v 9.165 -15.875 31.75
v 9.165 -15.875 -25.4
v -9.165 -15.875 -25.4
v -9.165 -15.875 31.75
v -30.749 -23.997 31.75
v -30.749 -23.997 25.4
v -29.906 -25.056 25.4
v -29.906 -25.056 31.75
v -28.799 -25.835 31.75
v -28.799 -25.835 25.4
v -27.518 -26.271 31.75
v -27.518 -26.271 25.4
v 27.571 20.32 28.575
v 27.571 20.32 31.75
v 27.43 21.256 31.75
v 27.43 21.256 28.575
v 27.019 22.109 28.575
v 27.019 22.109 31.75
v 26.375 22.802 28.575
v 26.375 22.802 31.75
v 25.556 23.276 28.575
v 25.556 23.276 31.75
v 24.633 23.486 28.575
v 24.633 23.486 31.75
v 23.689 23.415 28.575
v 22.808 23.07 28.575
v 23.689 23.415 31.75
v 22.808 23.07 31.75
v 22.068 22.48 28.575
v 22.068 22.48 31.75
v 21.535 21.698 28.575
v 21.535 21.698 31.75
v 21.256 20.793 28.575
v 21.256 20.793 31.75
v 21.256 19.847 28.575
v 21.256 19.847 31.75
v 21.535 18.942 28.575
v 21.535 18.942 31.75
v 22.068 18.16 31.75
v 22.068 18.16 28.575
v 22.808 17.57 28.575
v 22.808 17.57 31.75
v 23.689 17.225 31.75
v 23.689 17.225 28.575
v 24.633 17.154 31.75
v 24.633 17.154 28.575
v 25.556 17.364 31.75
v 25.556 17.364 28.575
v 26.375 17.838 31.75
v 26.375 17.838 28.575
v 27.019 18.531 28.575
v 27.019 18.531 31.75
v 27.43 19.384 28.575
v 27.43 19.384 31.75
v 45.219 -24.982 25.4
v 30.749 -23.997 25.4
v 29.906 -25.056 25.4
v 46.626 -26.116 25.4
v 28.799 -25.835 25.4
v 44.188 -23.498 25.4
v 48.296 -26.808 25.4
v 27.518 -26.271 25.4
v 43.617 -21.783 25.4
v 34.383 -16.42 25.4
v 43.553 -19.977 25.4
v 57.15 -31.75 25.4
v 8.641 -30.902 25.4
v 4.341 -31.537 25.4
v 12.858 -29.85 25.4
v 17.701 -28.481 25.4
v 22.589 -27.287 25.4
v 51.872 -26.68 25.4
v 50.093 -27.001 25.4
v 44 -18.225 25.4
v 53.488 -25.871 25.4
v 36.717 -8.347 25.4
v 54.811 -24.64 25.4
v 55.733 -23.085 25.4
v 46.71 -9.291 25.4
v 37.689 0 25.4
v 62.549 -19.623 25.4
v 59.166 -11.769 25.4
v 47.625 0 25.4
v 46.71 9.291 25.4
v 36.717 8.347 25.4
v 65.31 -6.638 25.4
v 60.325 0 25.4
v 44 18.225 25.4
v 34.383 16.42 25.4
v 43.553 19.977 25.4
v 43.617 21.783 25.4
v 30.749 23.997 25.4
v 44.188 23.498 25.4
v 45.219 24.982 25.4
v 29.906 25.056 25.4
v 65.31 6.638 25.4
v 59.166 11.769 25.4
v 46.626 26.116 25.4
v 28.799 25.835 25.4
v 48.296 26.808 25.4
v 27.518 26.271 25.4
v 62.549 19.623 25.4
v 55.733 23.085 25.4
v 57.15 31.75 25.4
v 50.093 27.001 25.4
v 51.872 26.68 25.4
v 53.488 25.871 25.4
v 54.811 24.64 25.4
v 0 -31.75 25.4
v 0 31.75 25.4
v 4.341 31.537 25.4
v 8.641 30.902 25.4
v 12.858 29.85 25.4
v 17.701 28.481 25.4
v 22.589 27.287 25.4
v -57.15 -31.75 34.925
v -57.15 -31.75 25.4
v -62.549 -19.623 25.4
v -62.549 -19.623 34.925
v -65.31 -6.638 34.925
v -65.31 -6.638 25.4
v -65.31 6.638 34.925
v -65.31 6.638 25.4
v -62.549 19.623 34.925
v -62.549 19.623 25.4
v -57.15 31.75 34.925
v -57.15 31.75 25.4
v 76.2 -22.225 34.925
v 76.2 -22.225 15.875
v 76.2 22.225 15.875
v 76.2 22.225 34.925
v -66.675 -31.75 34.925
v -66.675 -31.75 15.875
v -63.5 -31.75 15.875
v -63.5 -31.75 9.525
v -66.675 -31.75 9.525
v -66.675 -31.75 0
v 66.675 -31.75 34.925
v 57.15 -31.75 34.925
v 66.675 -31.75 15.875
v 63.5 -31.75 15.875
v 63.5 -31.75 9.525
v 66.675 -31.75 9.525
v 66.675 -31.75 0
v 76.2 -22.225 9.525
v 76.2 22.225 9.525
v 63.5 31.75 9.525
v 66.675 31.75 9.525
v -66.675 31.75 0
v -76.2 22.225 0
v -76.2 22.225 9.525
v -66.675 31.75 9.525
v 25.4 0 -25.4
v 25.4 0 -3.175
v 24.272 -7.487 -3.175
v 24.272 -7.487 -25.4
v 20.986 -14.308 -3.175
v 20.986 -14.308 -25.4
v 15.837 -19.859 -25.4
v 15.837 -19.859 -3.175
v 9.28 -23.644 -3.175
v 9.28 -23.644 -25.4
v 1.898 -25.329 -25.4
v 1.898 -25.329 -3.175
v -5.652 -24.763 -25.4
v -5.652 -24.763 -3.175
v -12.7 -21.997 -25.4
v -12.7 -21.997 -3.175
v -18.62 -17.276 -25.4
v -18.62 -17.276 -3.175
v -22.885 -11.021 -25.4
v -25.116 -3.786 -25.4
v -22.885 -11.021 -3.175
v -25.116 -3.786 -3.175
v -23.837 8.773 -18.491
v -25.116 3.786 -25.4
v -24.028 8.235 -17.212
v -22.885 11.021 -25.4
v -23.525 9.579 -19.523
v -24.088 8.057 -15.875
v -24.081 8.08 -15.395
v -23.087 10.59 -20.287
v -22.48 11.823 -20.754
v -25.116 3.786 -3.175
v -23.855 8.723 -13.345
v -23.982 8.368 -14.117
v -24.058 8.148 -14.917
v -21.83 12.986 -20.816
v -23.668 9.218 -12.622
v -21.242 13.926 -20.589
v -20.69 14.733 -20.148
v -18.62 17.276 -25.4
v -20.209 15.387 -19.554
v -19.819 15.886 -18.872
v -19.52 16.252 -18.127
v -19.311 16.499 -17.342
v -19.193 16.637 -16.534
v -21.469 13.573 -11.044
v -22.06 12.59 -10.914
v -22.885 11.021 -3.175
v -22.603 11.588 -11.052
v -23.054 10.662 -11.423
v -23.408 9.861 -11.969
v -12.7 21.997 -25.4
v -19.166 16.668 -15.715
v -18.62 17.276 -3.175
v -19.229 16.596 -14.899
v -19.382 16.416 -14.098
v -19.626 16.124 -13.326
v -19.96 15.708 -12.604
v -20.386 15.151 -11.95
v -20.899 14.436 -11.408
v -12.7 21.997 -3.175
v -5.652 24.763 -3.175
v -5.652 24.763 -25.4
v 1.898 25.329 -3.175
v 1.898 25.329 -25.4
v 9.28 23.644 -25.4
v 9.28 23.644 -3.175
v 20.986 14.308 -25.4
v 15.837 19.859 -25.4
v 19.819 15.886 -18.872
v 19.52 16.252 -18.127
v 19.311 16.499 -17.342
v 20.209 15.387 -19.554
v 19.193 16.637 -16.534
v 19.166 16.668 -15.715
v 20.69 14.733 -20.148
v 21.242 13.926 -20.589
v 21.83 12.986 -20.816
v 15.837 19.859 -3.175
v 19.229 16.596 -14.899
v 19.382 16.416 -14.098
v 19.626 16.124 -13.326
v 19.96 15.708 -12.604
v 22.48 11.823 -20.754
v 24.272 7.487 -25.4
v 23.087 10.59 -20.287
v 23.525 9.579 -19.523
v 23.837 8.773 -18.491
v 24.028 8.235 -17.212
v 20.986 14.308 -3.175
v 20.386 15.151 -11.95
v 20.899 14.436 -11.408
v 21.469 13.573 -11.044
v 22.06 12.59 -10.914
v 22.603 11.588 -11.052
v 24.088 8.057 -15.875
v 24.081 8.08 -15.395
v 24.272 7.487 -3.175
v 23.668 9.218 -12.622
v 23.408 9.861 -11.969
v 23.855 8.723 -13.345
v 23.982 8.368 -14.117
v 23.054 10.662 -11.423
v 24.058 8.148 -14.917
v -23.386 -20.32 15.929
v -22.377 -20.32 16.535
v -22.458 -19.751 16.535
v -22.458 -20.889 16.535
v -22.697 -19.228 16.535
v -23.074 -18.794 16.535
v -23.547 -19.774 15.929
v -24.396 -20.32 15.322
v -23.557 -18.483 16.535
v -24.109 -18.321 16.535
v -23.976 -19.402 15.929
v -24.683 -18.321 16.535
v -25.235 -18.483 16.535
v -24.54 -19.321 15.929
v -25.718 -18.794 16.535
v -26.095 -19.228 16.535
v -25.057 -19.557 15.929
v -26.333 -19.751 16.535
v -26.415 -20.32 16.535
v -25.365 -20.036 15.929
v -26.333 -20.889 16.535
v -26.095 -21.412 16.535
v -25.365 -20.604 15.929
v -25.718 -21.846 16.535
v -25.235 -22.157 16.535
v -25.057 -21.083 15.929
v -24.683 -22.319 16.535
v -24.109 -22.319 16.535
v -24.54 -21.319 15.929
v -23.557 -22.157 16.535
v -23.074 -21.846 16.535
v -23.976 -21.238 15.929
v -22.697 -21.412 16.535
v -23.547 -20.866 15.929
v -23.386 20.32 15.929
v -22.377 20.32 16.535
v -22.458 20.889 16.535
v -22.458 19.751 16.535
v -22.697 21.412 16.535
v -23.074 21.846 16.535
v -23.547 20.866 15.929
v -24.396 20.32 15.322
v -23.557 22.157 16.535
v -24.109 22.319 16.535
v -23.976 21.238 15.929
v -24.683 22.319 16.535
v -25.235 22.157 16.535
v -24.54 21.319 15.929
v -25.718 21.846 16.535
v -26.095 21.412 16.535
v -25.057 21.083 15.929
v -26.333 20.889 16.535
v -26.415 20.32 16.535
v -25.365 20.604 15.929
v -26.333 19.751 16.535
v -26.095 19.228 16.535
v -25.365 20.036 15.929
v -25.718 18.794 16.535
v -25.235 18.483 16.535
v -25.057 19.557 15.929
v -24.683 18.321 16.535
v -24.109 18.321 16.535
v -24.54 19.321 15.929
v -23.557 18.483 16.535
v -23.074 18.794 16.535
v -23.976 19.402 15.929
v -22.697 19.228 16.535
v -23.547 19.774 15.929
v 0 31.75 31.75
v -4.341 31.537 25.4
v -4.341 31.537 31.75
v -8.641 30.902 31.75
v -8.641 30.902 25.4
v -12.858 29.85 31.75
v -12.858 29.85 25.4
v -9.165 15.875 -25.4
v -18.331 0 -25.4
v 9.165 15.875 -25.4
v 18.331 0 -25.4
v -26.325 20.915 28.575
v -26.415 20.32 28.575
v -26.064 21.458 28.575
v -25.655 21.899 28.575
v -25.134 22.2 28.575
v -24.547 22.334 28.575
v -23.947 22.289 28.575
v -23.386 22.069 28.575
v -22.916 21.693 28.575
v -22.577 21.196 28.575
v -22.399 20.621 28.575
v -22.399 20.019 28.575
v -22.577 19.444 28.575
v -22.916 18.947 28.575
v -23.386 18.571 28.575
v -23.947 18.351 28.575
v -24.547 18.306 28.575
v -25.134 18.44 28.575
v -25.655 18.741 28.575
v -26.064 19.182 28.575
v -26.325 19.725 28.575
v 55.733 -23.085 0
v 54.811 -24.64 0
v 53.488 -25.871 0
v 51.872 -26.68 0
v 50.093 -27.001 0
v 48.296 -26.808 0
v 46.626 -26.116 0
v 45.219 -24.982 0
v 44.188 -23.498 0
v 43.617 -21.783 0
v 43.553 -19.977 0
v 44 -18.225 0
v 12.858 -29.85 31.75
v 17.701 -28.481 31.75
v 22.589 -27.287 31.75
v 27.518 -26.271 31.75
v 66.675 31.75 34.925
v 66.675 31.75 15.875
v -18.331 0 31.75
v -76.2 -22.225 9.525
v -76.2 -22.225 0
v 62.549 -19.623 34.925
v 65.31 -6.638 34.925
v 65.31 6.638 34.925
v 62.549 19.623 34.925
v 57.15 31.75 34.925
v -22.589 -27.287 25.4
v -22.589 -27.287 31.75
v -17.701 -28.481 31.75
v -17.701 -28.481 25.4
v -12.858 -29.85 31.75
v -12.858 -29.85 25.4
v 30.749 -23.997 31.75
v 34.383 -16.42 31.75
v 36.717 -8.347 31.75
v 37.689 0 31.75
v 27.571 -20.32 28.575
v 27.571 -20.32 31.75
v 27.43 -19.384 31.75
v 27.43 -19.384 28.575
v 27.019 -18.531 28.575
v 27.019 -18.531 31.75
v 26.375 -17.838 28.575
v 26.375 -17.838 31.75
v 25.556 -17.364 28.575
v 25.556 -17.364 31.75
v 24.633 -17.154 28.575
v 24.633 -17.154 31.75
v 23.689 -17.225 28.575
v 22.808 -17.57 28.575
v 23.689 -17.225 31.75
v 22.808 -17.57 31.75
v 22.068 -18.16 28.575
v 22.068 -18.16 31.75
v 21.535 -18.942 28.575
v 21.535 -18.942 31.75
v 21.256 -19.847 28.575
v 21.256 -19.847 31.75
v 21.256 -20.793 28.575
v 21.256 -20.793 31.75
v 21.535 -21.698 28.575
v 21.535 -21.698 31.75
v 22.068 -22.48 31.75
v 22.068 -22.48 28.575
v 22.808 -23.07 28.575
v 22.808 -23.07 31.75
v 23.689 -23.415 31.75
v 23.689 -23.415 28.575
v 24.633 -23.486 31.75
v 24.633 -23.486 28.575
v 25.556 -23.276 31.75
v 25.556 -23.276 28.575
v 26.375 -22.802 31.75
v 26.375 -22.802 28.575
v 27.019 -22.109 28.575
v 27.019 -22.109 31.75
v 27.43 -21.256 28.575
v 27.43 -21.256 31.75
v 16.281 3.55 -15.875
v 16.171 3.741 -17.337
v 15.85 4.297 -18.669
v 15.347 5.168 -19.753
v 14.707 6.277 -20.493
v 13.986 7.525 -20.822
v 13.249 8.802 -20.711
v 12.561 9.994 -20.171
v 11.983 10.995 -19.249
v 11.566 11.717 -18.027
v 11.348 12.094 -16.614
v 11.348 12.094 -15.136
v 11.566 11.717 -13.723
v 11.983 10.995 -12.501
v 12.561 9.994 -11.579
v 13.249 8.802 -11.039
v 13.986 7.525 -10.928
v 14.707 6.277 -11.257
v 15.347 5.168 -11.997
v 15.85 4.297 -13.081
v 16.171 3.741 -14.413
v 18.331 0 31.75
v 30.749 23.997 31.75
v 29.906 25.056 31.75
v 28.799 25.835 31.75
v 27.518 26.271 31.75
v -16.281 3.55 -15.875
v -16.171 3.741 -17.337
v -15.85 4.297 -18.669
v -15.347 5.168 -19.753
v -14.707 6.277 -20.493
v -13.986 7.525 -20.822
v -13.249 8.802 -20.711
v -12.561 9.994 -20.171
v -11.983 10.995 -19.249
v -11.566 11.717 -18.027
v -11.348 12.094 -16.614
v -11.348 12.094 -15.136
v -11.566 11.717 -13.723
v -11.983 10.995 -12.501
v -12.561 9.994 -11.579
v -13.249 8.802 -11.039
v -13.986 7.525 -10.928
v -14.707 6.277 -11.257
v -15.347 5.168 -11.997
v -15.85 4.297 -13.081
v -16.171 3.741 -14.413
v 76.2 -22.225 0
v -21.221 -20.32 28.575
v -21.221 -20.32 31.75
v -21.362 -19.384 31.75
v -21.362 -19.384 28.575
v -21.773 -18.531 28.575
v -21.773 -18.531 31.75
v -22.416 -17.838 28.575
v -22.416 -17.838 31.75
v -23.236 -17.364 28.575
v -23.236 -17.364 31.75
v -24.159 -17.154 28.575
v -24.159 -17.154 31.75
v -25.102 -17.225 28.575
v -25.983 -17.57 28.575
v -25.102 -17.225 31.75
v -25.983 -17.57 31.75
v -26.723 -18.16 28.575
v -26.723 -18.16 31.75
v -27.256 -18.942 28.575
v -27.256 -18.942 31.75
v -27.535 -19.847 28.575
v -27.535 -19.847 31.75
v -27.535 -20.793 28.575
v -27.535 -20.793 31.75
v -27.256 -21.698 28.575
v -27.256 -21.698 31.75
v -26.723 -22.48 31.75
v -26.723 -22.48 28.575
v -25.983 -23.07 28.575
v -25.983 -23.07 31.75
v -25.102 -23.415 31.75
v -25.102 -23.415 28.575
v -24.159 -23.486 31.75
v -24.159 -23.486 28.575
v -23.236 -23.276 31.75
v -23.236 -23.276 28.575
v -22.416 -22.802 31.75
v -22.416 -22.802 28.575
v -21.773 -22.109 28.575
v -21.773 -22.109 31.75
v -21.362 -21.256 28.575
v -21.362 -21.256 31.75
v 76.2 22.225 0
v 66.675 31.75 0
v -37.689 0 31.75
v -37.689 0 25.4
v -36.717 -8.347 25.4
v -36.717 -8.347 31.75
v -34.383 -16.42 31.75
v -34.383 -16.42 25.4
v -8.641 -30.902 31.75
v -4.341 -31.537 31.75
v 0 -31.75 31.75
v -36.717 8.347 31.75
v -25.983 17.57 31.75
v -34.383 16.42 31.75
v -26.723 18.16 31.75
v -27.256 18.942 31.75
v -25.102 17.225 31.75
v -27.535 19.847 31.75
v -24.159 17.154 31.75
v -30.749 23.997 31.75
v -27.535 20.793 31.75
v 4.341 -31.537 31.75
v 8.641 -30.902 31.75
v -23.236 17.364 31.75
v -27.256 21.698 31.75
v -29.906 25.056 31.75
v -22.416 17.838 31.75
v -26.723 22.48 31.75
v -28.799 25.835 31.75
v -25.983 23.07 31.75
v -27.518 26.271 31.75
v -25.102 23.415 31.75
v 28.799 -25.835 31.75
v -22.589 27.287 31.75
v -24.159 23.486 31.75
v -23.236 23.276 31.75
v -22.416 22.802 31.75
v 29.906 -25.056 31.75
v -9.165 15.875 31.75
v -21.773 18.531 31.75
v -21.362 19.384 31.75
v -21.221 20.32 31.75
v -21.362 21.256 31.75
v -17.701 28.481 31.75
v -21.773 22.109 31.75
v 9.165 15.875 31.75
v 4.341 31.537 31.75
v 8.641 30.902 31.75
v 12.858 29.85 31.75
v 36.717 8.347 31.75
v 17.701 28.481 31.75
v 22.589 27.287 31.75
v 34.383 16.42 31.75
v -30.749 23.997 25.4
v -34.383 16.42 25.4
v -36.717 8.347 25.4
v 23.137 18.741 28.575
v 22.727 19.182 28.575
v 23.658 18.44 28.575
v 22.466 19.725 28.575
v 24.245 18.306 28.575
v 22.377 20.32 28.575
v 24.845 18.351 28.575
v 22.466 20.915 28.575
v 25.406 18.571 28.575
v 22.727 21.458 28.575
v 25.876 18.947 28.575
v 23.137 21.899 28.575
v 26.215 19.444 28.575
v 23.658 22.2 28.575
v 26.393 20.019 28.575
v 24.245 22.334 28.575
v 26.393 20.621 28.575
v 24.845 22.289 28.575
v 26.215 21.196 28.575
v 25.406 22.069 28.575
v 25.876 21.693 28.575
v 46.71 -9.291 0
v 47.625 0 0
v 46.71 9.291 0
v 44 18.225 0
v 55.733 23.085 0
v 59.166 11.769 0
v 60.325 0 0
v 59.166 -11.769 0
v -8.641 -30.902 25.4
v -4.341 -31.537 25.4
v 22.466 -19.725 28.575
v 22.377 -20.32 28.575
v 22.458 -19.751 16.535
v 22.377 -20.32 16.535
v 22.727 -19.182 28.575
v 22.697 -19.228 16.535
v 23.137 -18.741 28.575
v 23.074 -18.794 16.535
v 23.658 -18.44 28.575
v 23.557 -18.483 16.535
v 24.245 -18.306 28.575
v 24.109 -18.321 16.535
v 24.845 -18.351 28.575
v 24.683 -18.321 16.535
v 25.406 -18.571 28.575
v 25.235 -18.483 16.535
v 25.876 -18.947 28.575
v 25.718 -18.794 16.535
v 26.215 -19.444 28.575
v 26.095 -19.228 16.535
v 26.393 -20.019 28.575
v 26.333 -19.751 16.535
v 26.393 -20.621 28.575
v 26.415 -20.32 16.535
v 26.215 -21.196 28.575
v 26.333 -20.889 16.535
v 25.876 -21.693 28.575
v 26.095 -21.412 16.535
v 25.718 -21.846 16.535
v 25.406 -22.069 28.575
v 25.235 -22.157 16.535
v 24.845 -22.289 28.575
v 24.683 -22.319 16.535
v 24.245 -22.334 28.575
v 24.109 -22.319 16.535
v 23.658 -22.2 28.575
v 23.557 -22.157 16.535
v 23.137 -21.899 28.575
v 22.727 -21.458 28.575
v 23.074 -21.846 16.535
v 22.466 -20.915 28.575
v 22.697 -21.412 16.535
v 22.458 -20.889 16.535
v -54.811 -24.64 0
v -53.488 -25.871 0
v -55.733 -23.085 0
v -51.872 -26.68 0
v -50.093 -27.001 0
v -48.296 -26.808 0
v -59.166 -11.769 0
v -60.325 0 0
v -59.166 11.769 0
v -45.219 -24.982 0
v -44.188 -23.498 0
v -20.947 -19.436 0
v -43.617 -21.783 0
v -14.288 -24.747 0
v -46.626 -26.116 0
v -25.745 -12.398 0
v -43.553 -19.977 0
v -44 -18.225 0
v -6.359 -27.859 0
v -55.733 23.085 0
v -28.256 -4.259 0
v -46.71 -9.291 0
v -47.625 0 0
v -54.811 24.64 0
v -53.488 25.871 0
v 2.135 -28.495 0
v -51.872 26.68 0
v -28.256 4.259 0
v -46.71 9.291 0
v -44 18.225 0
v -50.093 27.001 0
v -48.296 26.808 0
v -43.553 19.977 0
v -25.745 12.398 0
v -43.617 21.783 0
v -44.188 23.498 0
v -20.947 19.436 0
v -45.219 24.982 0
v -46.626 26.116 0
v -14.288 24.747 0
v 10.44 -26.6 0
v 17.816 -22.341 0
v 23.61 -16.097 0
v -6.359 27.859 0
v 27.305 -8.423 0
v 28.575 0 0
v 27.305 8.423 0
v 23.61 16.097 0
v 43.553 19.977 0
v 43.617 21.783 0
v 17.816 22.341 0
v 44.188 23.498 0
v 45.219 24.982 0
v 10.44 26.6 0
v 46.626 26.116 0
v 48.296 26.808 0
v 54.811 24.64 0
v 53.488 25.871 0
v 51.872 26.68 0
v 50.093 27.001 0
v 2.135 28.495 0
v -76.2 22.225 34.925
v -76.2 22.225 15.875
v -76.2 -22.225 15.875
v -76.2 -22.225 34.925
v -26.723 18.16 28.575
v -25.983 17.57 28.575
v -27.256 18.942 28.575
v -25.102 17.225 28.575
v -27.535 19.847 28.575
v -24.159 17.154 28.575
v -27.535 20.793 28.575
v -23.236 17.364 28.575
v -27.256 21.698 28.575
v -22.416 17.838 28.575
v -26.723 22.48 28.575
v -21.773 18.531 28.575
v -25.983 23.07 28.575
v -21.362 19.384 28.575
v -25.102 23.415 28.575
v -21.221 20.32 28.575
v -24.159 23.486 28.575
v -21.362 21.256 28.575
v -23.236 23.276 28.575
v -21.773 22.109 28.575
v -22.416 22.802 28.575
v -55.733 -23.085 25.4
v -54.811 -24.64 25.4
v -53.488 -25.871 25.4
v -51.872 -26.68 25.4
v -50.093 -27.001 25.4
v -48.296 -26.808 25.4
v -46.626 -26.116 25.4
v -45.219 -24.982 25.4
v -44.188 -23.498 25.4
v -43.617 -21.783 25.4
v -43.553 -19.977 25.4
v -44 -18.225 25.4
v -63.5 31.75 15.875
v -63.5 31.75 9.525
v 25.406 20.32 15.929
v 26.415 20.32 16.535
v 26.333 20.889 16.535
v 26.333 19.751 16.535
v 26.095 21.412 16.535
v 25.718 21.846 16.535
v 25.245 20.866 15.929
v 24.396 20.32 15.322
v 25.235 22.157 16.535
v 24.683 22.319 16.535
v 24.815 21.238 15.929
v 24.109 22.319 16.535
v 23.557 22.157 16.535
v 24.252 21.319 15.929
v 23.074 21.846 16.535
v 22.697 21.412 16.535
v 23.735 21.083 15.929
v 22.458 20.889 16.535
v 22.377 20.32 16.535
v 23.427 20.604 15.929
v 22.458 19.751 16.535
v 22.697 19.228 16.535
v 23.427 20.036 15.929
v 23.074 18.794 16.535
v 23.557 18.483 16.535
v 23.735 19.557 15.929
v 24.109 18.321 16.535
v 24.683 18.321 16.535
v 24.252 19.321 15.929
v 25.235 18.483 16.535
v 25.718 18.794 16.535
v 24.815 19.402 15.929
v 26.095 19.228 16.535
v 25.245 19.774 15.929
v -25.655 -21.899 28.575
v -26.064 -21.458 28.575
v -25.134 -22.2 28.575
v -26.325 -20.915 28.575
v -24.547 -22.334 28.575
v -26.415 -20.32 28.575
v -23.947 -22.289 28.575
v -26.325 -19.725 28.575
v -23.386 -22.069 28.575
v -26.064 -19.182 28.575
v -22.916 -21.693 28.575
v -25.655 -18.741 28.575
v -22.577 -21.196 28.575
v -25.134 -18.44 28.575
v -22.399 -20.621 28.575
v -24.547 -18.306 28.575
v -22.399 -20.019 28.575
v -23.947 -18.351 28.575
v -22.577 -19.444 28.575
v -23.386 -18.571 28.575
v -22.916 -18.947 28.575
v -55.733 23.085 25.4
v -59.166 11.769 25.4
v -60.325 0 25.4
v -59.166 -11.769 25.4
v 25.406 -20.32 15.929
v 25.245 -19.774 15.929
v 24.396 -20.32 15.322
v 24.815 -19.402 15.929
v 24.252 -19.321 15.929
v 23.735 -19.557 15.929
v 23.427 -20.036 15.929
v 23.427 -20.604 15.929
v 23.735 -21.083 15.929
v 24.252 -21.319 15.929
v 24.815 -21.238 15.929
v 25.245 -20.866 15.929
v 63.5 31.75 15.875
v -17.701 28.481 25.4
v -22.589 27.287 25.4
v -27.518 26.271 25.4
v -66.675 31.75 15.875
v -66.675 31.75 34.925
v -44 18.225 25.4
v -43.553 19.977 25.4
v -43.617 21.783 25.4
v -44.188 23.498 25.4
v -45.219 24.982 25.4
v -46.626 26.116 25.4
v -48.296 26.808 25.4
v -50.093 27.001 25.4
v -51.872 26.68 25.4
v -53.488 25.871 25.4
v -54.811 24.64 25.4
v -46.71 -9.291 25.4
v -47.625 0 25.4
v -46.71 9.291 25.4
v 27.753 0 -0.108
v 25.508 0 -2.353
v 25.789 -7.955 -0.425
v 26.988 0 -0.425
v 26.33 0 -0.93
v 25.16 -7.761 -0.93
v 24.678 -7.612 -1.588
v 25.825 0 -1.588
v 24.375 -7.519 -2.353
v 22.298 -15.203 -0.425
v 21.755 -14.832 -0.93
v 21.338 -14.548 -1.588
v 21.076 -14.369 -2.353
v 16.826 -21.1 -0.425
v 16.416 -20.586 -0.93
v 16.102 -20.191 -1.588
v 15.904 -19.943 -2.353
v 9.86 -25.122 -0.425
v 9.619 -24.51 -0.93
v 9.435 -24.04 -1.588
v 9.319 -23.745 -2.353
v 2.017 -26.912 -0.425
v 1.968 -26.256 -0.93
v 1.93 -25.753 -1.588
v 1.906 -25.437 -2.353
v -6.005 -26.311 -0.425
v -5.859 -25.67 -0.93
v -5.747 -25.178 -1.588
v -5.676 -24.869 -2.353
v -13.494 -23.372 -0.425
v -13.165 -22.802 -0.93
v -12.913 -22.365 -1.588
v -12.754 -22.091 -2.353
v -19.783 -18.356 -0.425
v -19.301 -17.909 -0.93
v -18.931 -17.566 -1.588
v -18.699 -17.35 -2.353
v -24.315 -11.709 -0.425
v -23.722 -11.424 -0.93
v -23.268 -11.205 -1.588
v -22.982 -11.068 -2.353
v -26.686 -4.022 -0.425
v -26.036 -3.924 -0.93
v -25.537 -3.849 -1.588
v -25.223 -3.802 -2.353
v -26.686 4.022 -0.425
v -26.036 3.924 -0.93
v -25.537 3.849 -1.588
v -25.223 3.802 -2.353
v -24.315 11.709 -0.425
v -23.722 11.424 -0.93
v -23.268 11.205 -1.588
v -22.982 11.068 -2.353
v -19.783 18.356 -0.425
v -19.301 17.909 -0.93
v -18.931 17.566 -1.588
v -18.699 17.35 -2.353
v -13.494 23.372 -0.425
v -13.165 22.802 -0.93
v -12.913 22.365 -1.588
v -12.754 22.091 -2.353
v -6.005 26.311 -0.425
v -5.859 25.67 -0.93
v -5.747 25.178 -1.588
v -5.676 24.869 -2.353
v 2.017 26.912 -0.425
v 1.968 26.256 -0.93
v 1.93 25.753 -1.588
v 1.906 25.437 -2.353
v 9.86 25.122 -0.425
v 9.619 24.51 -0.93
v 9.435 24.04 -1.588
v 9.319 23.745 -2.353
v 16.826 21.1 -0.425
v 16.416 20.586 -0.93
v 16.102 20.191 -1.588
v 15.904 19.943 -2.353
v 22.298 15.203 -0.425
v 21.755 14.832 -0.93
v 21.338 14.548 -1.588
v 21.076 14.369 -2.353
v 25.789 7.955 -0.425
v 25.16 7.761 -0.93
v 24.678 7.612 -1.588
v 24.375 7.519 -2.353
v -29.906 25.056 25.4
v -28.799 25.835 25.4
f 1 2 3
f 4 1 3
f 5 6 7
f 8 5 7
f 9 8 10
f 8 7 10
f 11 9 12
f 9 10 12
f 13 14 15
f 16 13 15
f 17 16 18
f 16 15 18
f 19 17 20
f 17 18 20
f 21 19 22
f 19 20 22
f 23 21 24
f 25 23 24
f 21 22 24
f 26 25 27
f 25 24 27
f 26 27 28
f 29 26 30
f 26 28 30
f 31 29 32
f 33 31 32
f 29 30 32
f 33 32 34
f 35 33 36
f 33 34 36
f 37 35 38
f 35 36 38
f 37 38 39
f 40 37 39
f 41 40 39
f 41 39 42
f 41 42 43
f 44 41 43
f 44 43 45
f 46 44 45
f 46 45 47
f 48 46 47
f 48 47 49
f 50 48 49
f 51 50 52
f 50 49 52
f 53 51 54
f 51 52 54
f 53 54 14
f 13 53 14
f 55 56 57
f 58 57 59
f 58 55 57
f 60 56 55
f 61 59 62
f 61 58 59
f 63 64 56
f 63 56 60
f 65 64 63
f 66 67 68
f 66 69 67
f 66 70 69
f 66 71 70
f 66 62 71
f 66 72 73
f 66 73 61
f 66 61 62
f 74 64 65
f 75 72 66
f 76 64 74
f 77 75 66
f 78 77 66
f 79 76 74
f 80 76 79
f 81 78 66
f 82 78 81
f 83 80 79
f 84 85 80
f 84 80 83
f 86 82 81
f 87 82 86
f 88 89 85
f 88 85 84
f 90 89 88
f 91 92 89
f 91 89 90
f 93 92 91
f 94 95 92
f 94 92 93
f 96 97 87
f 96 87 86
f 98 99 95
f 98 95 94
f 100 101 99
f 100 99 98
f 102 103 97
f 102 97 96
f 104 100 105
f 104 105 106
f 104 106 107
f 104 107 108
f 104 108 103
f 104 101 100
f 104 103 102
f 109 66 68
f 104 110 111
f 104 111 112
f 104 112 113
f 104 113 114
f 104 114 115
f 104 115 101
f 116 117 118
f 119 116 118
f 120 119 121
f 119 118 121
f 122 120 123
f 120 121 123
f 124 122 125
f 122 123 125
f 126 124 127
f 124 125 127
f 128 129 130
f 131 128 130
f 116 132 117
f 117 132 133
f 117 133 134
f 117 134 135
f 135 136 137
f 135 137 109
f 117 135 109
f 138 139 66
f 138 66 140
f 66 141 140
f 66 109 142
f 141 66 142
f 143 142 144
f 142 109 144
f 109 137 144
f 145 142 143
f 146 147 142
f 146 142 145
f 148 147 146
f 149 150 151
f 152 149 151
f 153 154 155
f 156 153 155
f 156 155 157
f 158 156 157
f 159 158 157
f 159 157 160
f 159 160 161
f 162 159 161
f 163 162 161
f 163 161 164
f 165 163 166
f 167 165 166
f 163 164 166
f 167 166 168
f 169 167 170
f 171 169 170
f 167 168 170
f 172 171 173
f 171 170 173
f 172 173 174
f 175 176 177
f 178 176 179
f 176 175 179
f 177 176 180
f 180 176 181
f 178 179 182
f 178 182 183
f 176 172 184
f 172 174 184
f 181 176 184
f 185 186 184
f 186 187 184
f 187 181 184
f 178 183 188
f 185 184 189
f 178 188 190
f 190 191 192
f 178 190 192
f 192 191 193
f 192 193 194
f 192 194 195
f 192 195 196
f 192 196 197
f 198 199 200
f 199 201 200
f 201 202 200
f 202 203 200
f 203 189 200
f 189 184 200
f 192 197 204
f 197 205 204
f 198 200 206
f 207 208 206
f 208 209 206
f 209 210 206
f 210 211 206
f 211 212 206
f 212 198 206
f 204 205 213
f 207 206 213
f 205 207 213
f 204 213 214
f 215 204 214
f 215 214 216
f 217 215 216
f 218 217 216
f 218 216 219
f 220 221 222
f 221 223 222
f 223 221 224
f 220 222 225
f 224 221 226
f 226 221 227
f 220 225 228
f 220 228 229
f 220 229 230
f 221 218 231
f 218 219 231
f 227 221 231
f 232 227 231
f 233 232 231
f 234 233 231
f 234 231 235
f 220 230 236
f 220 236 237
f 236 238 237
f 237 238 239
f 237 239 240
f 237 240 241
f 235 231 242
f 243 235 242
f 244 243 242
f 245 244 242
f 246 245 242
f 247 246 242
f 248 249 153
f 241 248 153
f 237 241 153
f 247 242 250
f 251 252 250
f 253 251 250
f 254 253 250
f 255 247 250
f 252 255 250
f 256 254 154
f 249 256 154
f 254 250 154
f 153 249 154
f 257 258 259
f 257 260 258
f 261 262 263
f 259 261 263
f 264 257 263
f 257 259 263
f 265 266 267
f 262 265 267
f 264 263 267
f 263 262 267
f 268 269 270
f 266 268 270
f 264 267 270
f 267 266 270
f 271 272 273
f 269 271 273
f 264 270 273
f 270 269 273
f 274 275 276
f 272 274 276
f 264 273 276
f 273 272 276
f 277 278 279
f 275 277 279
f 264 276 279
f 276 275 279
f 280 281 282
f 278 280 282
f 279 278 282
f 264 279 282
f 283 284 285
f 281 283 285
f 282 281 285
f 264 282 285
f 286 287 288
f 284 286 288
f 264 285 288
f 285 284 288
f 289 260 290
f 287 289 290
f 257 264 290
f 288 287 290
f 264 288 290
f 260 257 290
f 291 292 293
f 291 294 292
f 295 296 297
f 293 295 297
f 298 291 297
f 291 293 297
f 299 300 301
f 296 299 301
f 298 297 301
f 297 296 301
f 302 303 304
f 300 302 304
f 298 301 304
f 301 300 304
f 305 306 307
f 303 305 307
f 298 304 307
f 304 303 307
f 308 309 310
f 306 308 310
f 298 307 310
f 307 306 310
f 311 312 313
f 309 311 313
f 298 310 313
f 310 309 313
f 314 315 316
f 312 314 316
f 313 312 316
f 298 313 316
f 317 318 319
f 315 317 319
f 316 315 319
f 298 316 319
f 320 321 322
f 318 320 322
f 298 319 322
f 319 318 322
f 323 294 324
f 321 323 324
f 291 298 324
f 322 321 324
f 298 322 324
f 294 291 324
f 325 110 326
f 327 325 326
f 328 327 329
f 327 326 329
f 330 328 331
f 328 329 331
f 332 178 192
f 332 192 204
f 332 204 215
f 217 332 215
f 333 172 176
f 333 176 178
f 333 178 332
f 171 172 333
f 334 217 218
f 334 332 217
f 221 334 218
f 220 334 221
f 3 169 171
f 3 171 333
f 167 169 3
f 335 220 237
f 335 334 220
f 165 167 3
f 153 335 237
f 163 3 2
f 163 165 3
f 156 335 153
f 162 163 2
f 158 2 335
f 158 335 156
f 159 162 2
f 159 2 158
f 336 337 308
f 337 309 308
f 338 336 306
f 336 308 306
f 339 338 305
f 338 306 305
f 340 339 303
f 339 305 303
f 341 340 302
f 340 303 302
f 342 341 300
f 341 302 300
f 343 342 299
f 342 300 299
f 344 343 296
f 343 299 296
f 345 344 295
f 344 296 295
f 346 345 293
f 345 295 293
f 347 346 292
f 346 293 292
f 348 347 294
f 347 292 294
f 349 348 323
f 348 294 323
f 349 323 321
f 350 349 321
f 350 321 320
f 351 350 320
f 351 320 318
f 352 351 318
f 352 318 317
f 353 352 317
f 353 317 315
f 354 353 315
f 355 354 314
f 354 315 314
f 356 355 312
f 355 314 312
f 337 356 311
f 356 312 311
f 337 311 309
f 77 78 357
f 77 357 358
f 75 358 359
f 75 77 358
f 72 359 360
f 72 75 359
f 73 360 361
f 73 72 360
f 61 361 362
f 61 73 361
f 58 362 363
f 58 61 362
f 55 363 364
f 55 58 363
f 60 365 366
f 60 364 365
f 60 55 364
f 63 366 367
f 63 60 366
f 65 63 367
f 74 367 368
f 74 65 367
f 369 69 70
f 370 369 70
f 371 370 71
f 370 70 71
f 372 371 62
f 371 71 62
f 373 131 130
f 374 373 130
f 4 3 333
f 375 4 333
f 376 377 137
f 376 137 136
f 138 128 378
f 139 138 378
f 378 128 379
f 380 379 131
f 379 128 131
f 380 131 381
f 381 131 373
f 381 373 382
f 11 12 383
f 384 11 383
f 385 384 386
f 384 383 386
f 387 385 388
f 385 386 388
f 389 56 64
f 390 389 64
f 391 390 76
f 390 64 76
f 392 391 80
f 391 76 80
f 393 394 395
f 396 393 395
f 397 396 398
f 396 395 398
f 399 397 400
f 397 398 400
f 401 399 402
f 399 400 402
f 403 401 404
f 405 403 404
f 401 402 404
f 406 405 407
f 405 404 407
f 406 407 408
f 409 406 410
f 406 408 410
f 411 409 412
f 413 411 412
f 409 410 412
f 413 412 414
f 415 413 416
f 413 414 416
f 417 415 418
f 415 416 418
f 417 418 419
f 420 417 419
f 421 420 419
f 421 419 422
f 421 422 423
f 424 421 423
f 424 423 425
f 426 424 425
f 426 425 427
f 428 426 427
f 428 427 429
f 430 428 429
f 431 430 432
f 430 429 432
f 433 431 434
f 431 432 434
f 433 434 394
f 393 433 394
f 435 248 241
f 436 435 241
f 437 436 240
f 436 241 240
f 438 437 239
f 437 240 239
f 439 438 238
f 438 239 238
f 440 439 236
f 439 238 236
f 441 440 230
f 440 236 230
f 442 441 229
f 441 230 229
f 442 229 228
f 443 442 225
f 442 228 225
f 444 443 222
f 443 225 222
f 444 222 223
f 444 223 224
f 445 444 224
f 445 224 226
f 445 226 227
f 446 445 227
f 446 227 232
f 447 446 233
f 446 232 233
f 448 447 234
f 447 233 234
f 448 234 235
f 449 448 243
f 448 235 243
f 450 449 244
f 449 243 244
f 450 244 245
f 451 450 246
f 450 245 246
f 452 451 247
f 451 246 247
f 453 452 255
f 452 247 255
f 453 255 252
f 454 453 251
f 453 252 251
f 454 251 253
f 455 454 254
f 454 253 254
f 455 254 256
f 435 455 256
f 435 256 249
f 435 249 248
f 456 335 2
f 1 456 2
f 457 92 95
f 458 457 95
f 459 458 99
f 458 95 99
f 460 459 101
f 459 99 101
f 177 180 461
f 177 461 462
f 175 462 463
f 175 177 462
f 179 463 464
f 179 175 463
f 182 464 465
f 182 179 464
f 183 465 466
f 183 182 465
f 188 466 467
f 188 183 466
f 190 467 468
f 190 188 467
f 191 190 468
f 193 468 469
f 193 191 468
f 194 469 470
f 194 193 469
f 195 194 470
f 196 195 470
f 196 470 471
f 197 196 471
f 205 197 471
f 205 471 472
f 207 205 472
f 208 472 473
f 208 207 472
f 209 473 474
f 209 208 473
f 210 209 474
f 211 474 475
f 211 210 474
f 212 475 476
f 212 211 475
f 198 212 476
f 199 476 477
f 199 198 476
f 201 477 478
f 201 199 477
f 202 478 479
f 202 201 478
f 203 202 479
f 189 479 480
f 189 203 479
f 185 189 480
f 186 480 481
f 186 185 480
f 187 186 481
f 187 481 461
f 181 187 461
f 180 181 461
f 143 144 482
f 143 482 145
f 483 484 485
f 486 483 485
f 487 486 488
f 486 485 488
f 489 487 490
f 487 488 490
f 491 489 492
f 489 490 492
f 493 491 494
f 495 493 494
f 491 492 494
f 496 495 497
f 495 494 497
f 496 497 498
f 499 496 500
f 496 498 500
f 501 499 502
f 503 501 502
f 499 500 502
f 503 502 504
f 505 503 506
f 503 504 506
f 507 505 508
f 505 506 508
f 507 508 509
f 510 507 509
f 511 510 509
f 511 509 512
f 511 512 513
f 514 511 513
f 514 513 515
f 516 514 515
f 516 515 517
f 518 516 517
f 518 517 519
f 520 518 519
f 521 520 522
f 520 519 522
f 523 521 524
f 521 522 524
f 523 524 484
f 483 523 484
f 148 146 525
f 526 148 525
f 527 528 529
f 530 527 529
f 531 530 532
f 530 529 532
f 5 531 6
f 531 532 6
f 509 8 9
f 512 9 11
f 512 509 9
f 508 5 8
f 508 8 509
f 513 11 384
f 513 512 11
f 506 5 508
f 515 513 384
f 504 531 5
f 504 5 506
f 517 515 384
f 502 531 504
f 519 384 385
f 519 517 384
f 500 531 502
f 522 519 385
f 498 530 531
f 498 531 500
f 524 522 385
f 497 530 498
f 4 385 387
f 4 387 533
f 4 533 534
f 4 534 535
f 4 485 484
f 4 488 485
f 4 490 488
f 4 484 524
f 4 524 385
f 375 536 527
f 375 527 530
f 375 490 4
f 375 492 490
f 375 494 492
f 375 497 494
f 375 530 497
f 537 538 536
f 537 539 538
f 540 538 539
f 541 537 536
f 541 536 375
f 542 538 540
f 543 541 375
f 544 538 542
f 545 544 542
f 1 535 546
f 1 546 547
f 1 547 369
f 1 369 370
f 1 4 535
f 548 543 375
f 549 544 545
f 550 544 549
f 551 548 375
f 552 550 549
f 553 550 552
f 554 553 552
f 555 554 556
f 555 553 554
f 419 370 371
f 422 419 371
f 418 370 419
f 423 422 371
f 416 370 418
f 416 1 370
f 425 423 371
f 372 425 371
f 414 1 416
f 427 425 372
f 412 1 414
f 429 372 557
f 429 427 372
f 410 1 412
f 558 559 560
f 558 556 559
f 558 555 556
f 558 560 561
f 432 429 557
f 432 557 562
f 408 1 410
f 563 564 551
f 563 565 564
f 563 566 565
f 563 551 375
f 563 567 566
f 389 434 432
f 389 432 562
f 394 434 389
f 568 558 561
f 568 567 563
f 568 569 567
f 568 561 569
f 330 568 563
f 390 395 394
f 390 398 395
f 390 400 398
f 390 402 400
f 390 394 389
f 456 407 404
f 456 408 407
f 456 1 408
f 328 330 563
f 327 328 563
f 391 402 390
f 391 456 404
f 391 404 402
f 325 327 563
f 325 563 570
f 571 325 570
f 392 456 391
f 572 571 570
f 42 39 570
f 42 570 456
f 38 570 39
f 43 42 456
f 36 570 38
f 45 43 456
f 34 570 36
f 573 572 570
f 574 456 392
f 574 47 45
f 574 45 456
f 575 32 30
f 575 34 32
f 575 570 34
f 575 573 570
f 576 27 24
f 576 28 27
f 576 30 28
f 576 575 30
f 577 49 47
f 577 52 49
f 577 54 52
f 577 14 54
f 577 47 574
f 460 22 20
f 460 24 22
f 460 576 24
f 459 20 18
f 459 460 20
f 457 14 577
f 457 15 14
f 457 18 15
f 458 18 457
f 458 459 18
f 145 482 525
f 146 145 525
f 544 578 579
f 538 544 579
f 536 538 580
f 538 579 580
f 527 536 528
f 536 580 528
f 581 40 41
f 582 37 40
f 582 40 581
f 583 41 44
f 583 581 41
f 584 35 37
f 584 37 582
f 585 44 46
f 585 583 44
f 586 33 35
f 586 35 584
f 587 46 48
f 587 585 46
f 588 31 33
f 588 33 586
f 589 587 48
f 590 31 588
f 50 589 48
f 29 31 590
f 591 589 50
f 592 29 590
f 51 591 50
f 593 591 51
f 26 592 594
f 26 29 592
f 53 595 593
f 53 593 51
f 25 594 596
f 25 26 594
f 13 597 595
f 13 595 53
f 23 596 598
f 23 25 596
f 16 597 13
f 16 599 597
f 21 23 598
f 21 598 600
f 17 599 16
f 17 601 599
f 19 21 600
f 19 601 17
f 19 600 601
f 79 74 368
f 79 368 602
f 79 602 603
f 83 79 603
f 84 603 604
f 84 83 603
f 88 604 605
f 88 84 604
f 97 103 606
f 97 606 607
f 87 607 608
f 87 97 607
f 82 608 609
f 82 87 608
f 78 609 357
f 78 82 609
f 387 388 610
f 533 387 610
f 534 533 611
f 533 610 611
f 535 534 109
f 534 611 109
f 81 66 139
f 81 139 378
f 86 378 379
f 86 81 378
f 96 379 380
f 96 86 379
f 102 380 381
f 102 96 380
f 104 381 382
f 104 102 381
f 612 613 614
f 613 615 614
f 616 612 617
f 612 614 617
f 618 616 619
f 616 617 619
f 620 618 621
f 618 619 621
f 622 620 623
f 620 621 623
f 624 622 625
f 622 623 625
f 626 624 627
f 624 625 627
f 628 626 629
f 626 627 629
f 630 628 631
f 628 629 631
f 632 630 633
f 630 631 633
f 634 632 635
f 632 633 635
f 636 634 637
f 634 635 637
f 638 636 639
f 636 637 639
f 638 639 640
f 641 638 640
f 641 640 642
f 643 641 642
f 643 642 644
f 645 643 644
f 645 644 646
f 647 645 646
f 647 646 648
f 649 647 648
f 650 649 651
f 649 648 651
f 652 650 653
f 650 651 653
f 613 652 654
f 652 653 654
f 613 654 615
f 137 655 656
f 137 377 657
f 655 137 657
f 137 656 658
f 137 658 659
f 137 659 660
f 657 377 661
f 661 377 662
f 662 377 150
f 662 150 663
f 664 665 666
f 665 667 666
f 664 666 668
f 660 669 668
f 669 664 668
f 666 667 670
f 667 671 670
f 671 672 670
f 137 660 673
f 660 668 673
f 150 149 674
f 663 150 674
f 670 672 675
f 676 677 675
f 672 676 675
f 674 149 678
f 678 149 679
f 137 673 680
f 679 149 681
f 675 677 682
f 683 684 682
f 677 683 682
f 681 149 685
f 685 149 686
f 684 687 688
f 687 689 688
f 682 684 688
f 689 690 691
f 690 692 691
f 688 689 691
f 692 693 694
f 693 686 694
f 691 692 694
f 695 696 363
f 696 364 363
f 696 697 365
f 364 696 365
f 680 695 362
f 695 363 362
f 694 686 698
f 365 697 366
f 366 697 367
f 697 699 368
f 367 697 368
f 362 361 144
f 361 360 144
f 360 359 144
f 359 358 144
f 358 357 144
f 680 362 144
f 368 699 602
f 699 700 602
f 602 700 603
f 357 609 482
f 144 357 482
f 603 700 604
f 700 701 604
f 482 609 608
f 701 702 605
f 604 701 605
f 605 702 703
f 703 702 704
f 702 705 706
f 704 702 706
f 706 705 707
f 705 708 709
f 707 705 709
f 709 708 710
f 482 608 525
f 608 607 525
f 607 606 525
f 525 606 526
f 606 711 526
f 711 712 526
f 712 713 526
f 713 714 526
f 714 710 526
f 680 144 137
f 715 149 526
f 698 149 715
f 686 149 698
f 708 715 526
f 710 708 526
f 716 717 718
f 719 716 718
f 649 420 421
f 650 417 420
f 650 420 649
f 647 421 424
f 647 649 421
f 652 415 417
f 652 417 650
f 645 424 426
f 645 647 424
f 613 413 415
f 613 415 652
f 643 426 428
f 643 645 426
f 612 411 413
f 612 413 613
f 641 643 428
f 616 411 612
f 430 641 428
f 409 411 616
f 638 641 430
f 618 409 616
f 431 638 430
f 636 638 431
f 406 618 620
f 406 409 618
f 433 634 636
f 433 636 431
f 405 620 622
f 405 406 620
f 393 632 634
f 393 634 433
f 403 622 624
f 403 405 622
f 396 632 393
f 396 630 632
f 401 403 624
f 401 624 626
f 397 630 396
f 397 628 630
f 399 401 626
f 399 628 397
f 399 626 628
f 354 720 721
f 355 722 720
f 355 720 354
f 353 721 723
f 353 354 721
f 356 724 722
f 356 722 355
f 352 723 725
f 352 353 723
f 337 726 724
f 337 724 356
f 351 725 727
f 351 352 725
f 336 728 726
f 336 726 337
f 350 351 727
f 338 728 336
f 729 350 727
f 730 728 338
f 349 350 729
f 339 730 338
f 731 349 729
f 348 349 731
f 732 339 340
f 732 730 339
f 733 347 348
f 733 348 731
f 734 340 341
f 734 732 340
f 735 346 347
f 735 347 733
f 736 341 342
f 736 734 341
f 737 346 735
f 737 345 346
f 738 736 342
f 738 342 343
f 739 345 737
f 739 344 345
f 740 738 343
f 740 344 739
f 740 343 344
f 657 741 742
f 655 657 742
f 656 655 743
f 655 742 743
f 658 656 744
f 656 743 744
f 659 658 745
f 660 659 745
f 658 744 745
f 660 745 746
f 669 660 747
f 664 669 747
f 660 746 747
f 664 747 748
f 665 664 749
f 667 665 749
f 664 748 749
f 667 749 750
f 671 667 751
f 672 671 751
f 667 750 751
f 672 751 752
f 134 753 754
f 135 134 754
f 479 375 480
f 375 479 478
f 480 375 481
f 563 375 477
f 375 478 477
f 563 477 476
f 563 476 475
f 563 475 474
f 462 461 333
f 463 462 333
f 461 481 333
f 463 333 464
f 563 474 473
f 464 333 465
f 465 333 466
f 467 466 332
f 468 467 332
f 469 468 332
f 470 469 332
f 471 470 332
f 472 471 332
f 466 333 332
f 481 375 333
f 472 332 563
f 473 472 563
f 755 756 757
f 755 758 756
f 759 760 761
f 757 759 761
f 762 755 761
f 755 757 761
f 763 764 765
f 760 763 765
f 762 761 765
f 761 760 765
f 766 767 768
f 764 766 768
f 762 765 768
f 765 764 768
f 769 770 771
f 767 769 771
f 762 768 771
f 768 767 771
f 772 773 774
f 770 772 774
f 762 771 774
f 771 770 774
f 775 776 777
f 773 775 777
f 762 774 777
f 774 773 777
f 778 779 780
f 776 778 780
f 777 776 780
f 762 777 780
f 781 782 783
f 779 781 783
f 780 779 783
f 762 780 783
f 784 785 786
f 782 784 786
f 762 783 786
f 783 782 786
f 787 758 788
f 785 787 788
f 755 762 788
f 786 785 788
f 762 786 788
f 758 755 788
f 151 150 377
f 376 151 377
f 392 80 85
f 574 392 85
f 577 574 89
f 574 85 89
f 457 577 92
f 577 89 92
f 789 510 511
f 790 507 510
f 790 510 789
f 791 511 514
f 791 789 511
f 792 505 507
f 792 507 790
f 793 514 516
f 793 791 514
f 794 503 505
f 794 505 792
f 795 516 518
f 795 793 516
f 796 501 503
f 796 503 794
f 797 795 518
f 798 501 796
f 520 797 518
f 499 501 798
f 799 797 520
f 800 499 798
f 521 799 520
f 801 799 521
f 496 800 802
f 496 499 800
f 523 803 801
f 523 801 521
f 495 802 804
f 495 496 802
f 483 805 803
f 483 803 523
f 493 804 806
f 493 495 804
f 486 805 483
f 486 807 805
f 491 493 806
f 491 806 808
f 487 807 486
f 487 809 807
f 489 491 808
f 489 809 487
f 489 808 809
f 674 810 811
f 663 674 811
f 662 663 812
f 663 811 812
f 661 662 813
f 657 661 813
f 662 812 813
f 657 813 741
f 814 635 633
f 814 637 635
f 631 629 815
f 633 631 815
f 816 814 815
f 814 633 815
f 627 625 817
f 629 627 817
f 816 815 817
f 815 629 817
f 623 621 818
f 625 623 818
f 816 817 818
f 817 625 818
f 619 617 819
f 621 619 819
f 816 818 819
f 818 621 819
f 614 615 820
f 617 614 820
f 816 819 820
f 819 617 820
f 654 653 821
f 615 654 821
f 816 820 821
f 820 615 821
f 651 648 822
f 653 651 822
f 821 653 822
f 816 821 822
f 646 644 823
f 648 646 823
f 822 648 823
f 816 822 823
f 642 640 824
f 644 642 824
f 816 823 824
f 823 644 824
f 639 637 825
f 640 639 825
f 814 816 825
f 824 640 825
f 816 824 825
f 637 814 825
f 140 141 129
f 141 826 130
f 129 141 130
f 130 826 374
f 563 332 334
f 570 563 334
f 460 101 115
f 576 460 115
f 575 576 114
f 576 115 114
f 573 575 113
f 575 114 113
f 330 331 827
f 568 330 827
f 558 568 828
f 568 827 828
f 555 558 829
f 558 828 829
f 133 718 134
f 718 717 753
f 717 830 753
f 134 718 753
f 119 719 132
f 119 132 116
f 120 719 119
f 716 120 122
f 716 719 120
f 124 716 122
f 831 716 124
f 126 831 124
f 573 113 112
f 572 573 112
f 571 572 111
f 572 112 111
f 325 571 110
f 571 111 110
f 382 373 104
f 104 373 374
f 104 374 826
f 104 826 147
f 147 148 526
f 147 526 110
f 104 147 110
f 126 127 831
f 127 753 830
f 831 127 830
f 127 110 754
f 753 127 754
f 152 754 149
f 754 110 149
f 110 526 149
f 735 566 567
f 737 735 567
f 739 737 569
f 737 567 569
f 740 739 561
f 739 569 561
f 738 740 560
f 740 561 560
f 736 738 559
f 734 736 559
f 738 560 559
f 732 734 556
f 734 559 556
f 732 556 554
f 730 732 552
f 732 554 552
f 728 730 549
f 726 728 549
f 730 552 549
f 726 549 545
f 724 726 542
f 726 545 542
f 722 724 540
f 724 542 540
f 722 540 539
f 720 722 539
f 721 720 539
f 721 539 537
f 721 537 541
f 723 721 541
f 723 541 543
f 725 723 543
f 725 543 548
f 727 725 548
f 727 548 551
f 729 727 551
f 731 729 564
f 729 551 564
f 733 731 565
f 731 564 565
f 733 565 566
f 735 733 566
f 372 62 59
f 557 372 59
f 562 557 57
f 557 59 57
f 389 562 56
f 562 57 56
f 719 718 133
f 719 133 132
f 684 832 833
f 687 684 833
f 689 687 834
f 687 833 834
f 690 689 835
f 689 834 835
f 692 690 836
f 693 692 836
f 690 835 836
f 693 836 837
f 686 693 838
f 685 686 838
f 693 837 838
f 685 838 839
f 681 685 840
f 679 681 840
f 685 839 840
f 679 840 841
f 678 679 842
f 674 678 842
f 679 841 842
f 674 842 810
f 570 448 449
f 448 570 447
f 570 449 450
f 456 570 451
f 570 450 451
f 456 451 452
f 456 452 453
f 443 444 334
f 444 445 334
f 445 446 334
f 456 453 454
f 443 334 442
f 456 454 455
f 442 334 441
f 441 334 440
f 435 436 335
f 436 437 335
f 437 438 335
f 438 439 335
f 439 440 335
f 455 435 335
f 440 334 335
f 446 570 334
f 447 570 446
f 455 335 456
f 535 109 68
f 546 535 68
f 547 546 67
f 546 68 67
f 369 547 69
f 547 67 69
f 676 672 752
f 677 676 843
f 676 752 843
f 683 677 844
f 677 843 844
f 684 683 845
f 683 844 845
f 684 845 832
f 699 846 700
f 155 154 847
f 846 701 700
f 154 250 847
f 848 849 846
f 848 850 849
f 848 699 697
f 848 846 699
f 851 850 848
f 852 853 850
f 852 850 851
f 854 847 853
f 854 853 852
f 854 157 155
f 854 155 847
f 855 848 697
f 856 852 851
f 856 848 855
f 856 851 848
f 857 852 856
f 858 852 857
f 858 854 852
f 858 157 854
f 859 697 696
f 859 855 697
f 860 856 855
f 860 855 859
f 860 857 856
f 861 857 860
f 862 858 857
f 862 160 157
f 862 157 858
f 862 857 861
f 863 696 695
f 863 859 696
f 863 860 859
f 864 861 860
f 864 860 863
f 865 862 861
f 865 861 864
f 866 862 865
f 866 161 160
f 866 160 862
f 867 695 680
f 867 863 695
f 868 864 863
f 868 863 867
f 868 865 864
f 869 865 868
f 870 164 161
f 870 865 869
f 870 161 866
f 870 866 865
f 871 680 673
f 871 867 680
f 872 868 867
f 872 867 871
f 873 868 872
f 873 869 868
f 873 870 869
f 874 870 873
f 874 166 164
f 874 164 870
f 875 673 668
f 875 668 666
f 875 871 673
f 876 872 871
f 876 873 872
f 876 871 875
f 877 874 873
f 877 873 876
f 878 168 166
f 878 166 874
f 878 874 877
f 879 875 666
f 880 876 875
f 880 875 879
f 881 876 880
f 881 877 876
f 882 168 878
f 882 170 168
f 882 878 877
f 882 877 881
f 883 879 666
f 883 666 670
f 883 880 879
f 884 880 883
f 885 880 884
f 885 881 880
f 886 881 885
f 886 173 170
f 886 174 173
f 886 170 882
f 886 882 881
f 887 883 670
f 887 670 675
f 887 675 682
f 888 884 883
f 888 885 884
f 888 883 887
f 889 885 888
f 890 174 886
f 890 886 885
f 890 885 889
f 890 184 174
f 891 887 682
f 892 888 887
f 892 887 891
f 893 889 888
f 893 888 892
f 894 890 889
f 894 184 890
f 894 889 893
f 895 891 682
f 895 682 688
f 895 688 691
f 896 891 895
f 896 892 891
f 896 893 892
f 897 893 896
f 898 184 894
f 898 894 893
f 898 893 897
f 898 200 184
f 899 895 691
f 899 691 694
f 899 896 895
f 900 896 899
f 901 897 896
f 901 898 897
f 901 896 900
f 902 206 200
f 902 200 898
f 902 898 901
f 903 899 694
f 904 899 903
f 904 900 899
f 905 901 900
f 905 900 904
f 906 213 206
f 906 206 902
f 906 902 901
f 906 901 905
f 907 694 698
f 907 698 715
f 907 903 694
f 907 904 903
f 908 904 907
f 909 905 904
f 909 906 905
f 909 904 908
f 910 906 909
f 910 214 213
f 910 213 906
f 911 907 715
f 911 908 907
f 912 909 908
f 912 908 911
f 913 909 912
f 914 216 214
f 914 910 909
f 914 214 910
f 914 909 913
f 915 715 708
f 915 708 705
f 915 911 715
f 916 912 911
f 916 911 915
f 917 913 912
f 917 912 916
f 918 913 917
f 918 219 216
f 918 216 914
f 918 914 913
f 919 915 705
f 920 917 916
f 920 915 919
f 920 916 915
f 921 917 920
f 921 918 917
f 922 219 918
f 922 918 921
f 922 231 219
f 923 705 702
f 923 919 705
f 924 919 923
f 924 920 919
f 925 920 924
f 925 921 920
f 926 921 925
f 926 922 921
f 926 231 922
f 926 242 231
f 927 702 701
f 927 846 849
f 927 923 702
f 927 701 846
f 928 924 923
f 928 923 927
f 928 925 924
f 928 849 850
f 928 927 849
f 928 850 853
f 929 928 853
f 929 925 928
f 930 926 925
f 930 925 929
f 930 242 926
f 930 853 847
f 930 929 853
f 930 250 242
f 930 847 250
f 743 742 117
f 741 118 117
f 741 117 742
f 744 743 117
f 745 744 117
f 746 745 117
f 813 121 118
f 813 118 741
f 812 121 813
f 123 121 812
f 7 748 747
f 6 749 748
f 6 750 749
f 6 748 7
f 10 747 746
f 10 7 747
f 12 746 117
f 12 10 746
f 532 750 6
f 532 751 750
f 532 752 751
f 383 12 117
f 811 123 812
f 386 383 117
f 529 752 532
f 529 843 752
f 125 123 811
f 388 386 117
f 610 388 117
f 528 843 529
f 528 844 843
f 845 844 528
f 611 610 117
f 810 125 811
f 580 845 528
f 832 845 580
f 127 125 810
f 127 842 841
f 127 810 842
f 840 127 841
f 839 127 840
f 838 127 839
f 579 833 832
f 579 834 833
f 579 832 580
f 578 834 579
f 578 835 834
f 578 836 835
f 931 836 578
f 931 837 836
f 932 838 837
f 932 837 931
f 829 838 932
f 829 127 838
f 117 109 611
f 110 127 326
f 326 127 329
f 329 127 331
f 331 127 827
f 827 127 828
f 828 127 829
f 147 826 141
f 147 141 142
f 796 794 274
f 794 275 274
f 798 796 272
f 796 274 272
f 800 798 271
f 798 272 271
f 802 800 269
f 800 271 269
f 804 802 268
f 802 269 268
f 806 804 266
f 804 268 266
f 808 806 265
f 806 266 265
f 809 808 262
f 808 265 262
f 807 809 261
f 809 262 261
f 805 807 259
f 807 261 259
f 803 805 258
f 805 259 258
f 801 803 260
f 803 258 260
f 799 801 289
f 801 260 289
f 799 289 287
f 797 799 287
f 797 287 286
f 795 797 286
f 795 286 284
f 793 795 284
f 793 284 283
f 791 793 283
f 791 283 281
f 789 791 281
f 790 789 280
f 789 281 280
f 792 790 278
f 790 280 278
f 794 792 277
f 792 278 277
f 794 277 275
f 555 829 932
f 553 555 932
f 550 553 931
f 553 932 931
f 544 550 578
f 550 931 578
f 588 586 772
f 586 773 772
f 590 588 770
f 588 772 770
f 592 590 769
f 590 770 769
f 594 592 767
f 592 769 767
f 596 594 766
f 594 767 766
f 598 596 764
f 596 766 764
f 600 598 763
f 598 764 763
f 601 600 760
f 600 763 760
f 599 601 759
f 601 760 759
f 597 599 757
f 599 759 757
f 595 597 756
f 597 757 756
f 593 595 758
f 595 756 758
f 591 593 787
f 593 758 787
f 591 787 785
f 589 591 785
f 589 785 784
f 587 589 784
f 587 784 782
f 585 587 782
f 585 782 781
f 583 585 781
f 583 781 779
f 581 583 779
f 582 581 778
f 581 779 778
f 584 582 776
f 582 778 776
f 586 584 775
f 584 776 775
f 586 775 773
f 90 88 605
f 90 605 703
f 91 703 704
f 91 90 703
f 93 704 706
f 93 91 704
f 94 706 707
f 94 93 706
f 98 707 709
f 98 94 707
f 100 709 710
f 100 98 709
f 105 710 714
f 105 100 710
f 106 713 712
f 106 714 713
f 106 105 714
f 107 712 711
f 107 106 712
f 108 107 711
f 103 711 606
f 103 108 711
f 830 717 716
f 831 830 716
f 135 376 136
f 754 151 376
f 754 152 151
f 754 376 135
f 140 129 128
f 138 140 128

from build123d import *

# Parameters (mm, degrees)
SKETCH1_W                        = 152.4
SKETCH1_H                        = 63.5
BOSS_EXTRUDE1_DEPTH              = 25.4
BOSS_EXTRUDE2_DEPTH              = 9.525
BOSS_EXTRUDE3_DEPTH              = 6.35
CUT_EXTRUDE1_DEPTH               = 87.36933773
SKETCH5_R                        = 25.4
BOSS_EXTRUDE4_DEPTH              = 25.4
CUT_EXTRUDE2_DEPTH               = 103.242887894
F_7_16_20_TAPPED_HOLE2_OUTLINE_W = 4.96062
F_7_16_20_TAPPED_HOLE2_OUTLINE_H = 9.52526547
SKETCH13_R                       = 3.175
CUT_EXTRUDE3_DEPTH               = 3.175
F_10_32_TAPPED_HOLE1_D           = 4.0386
F_10_32_TAPPED_HOLE1_DEPTH       = 12.0396
F_10_32_TAPPED_HOLE1_TIP         = 1.213317848
FILLET1_R                        = 3.175
SKETCH16_W                       = 12.7
SKETCH16_H                       = 6.35
CUT_EXTRUDE4_DEPTH               = 106.159144277
CHAMFER1_SIZE                    = 9.525
CHAMFER2_SIZE                    = 9.525


# Read off the part's stored shape, not the designer's step: 7/16-20 Tapped Hole2
with BuildPart() as part:
    # Sketch1 → Boss-Extrude1 (new body)
    with BuildSketch(Plane.XY):
        Rectangle(SKETCH1_W, SKETCH1_H)
    extrude(amount=BOSS_EXTRUDE1_DEPTH)

    # Sketch2 → Boss-Extrude2 (add)
    with BuildSketch(Plane.XY.offset(25.4)):
        with BuildLine():
            Line((-57.15, 31.75), (-76.2, 31.75))
            Line((-76.2, 31.75), (-76.2, -31.75))
            Line((-76.2, -31.75), (-57.15, -31.75))
            ThreePointArc((-57.15, -31.75), (-65.65738686, 0), (-57.15, 31.75))
        make_face()
        with BuildLine():
            Line((57.15, 31.75), (76.2, 31.75))
            Line((76.2, 31.75), (76.2, -31.75))
            Line((76.2, -31.75), (57.15, -31.75))
            ThreePointArc((57.15, -31.75), (65.65738686, 0), (57.15, 31.75))
        make_face()
    extrude(amount=BOSS_EXTRUDE2_DEPTH)

    # Sketch3 → Boss-Extrude3 (add)
    with BuildSketch(Plane.XY.offset(25.4)):
        with BuildLine():
            ThreePointArc((0, 31.75), (-6.499067792, 31.272316494), (-12.858450657, 29.849532861))
            ThreePointArc((-12.858450657, 29.849532861), (-20.139715933, 27.86213325), (-27.51768912, 26.270878114))
            ThreePointArc((-27.51768912, 26.270878114), (-29.380205079, 25.48503317), (-30.748971212, 23.997418552))
            ThreePointArc((-30.748971212, 23.997418552), (-35.717260564, 12.431977761), (-37.689378393, 0))
            ThreePointArc((-37.689378393, 0), (-35.717260564, -12.431977761), (-30.748971212, -23.997418552))
            ThreePointArc((-30.748971212, -23.997418552), (-29.380205079, -25.48503317), (-27.51768912, -26.270878114))
            ThreePointArc((-27.51768912, -26.270878114), (-20.139715933, -27.86213325), (-12.858450657, -29.849532861))
            ThreePointArc((-12.858450657, -29.849532861), (-6.499067792, -31.272316494), (0, -31.75))
            ThreePointArc((0, -31.75), (6.499067792, -31.272316494), (12.858450657, -29.849532861))
            ThreePointArc((12.858450657, -29.849532861), (20.139715933, -27.86213325), (27.51768912, -26.270878114))
            ThreePointArc((27.51768912, -26.270878114), (29.380205079, -25.48503317), (30.748971212, -23.997418552))
            ThreePointArc((30.748971212, -23.997418552), (35.717260564, -12.431977761), (37.689378393, 0))
            ThreePointArc((37.689378393, 0), (35.717260564, 12.431977761), (30.748971212, 23.997418552))
            ThreePointArc((30.748971212, 23.997418552), (29.380205079, 25.48503317), (27.51768912, 26.270878114))
            ThreePointArc((27.51768912, 26.270878114), (20.139715933, 27.86213325), (12.858450657, 29.849532861))
            ThreePointArc((12.858450657, 29.849532861), (6.499067792, 31.272316494), (0, 31.75))
        make_face()
    extrude(amount=BOSS_EXTRUDE3_DEPTH)

    # Sketch4 → Cut-Extrude1 (cut, through all)
    with BuildSketch(Plane.XY.offset(25.4)):
        with BuildLine():
            ThreePointArc((-55.733032799, 23.085378057), (-60.325, 0), (-55.733032799, -23.085378057))
            ThreePointArc((-55.733032799, -23.085378057), (-47.436357972, -26.521973293), (-43.999762736, -18.225298466))
            ThreePointArc((-43.999762736, -18.225298466), (-47.625, 0), (-43.999762736, 18.225298466))
            ThreePointArc((-43.999762736, 18.225298466), (-47.436357972, 26.521973293), (-55.733032799, 23.085378057))
        make_face()
    cut_extrude1 = extrude(amount=-CUT_EXTRUDE1_DEPTH, mode=Mode.SUBTRACT)

    # Mirror1: Cut-Extrude1 across plane
    add(cut_extrude1.mirror(Plane(origin=(0, 0, 0), x_dir=(0, 0, 1), z_dir=(1, 0, 0))), mode=Mode.SUBTRACT)

    # Sketch5 → Boss-Extrude4 (add)
    with BuildSketch(Plane(origin=(0, 0, 0), x_dir=(-1, 0, 0), z_dir=(0, 0, -1))):
        with Locations(Location((0, 0, 0), (0, 0, 180))):
            Circle(SKETCH5_R)
    extrude(amount=BOSS_EXTRUDE4_DEPTH)

    # Sketch6 → Cut-Extrude2 (cut, through all)
    with BuildSketch(Plane(origin=(0, 0, -25.4), x_dir=(-1, 0, 0), z_dir=(0, 0, -1))):
        Polygon((9.165435523, -15.875), (18.330871047, 0), (9.165435523, 15.875), (-9.165435523, 15.875), (-18.330871047, 0), (-9.165435523, -15.875), align=None)
    extrude(amount=-CUT_EXTRUDE2_DEPTH, mode=Mode.SUBTRACT)

    # 7/16-20 Tapped Hole2 outline → 7/16-20 Tapped Hole2 (revolve, cut)
    with BuildSketch(Plane(origin=(0.052782238, -0.091421518, -15.875), x_dir=(0.5000000000000003, -0.8660254037844385, 0), z_dir=(0, 0, 1))):
        with Locations((2.48031, 20.637632735)):
            Rectangle(F_7_16_20_TAPPED_HOLE2_OUTLINE_W, F_7_16_20_TAPPED_HOLE2_OUTLINE_H)
    f_7_16_20_tapped_hole2 = revolve(axis=Axis((0.052782238, -0.091421518, -15.875), (0.8660254037844385, 0.5000000000000003, 0)), mode=Mode.SUBTRACT)

    # Mirror6: 7/16-20 Tapped Hole2 across plane
    add(f_7_16_20_tapped_hole2.mirror(Plane(origin=(0, 0, 0), x_dir=(0, 0, 1), z_dir=(1, 0, 0))), mode=Mode.SUBTRACT)

    # Sketch13 → Cut-Extrude3 (cut)
    with BuildSketch(Plane.XY.offset(31.75)):
        with Locations((-24.395903345, 20.32)):
            Circle(SKETCH13_R)
        with Locations((24.395903345, 20.32)):
            Circle(SKETCH13_R)
        with Locations((24.395903345, -20.32)):
            Circle(SKETCH13_R)
        with Locations((-24.395903345, -20.32)):
            Circle(SKETCH13_R)
    extrude(amount=-CUT_EXTRUDE3_DEPTH, mode=Mode.SUBTRACT)

    # #10-32 Tapped Hole1
    with Locations(Plane.XY.offset(28.575)):
        with Locations((-24.395903345, 20.32), (24.395903345, 20.32), (24.395903345, -20.32), (-24.395903345, -20.32)):
            Hole(F_10_32_TAPPED_HOLE1_D / 2, depth=F_10_32_TAPPED_HOLE1_DEPTH)
            with Locations((0, 0, -(F_10_32_TAPPED_HOLE1_DEPTH + F_10_32_TAPPED_HOLE1_TIP / 2))):  # 118° drill point
                Cone(0, F_10_32_TAPPED_HOLE1_D / 2, F_10_32_TAPPED_HOLE1_TIP, mode=Mode.SUBTRACT)

    # Fillet1
    fillet1_edges = [part.edges().sort_by_distance(p)[0] for p in [
        (-25.4, 0, 0),
    ]]
    fillet(fillet1_edges, radius=FILLET1_R)

    # Sketch16 → Cut-Extrude4 (cut, through all)
    with BuildSketch(Plane(origin=(0, 31.75, 0), x_dir=(1, 0, 0), z_dir=(0, 1, 0))):
        with Locations((69.85, -12.7)):
            Rectangle(SKETCH16_W, SKETCH16_H)
        with Locations((-69.85, -12.7)):
            Rectangle(SKETCH16_W, SKETCH16_H)
    extrude(amount=-CUT_EXTRUDE4_DEPTH, mode=Mode.SUBTRACT)

    # Chamfer1
    chamfer1_edges = [part.edges().sort_by_distance(p)[0] for p in [
        (-76.2, 31.75, 4.7625),
        (76.2, 31.75, 4.7625),
        (-76.2, 31.75, 25.4),
        (76.2, 31.75, 25.4),
    ]]
    chamfer(chamfer1_edges, length=CHAMFER1_SIZE)

    # Chamfer2
    chamfer2_edges = [part.edges().sort_by_distance(p)[0] for p in [
        (76.2, -31.75, 4.7625),
        (-76.2, -31.75, 4.7625),
        (76.2, -31.75, 25.4),
        (-76.2, -31.75, 25.4),
    ]]
    chamfer(chamfer2_edges, length=CHAMFER2_SIZE)


solid = part.part
